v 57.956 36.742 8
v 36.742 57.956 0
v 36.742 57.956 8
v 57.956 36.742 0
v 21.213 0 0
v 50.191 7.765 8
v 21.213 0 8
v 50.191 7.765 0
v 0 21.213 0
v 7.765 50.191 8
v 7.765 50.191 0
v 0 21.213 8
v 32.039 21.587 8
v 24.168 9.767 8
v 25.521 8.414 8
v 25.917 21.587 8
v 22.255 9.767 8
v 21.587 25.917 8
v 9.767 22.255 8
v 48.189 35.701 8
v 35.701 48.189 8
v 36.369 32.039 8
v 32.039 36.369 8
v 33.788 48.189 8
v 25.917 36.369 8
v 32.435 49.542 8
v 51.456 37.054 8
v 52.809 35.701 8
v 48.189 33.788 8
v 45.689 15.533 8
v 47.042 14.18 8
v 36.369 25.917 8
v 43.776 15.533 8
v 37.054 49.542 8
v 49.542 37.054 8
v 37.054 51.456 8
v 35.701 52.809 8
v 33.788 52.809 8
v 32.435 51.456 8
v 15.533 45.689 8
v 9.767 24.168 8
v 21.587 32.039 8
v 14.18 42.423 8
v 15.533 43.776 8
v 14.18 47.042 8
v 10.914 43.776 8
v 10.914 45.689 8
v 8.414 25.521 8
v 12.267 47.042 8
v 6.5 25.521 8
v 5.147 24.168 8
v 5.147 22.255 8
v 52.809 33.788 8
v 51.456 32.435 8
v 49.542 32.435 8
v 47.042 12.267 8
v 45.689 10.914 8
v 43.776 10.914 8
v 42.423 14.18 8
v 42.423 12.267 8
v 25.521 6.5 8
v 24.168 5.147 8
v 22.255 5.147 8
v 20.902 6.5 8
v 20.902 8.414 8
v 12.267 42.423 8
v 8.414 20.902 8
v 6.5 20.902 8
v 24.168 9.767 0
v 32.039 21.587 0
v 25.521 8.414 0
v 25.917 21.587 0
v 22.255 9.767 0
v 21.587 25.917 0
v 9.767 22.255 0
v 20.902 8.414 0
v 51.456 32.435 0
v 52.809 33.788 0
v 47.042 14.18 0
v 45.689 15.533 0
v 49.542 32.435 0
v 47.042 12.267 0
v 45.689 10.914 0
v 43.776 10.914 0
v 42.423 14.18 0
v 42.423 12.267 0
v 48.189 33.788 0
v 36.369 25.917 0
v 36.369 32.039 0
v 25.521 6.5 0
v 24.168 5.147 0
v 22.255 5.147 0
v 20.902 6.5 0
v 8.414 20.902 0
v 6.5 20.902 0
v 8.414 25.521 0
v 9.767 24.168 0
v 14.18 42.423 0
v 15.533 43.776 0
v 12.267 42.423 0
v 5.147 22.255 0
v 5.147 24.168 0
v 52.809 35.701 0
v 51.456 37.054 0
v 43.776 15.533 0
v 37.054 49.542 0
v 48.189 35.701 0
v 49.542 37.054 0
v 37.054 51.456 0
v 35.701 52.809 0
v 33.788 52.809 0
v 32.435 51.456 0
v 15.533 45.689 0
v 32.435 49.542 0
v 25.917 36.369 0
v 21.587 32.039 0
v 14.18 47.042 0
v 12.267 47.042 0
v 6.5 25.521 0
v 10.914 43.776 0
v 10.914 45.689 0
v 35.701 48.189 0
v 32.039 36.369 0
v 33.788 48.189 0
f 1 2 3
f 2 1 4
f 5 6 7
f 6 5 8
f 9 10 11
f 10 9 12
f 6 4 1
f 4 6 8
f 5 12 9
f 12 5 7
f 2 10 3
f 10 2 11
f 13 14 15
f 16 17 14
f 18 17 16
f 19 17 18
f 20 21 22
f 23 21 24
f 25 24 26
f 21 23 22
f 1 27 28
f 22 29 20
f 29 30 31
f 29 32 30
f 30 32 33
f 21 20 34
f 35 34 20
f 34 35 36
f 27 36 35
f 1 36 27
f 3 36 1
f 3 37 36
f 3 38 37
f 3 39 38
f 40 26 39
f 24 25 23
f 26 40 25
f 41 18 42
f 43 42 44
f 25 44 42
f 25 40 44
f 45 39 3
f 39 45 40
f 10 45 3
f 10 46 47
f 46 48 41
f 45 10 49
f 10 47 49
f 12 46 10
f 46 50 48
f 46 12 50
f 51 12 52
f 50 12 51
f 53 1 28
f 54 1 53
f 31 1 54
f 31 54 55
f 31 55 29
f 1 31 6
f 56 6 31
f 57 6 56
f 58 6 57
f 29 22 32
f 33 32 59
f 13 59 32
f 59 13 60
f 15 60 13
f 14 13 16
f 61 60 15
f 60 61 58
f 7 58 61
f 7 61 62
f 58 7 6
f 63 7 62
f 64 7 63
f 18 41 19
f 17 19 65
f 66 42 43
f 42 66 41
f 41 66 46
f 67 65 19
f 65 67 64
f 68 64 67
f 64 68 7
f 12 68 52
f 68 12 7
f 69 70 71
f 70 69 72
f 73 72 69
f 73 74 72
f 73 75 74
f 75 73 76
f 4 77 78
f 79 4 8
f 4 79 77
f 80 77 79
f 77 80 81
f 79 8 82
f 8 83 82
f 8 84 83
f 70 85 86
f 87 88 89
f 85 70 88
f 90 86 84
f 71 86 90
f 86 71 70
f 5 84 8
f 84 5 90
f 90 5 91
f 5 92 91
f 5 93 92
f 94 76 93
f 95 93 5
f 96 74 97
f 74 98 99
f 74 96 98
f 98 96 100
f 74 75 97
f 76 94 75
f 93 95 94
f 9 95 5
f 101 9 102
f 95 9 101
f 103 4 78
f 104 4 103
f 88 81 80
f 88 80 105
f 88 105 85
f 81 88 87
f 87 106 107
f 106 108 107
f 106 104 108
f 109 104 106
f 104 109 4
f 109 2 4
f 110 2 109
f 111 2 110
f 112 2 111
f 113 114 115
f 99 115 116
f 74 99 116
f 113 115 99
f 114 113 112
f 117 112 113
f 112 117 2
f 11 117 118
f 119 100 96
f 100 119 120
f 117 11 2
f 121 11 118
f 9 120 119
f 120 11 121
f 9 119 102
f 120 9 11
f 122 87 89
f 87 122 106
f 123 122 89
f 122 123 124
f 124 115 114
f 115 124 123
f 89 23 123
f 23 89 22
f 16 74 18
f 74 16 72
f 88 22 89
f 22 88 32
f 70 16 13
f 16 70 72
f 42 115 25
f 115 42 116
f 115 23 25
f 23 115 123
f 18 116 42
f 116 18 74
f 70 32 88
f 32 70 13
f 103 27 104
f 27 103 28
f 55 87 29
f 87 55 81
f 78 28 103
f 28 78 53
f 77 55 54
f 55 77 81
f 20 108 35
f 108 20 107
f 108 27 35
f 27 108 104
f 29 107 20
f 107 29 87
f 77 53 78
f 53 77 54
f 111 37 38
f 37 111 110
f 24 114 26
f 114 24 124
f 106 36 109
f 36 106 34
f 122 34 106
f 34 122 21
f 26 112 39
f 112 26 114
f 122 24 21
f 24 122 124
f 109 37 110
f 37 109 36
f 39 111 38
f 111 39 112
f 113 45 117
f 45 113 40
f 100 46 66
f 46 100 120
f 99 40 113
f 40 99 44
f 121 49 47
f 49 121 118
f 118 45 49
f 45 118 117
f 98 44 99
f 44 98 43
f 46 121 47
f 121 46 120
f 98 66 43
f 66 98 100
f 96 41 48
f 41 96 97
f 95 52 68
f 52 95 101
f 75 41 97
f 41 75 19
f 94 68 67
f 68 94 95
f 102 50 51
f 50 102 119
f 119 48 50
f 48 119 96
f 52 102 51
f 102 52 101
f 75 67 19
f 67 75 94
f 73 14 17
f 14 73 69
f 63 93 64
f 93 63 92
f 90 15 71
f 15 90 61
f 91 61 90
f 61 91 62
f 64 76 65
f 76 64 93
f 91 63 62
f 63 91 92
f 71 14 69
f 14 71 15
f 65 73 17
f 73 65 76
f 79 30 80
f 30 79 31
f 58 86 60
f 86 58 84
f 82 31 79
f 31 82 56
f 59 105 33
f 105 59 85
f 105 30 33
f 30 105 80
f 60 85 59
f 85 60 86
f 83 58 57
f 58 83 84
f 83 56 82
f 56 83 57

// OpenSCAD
$fn = 32;

// ----------------------------------------------------------------------
// Polygon plate: 6-gon R30, 6 bolt windows
// ----------------------------------------------------------------------

// --- parameters (mm) ---
sides = 6;                // number of polygon sides
plate_r = 30;             // circumscribed radius of the polygon
bore_r = 8;               // centre bore radius
bolts = 6;                // number of bolt windows
ring_r = 22.28;           // bolt-circle radius
bolt_r = 2.5;             // bolt window radius
plate_t = 8;              // plate thickness, Z (extrusion height)
fit_tol = 0.1;            // declared fit tolerance (prompt contract)
free_tol = 0.5;           // declared free tolerance (prompt contract)

plate_d = 2 * plate_r;  // circumscribed diameter
bore_d = 2 * bore_r;  // centre bore diameter
bolt_d = 2 * bolt_r;  // bolt window diameter
ring_d = 2 * ring_r;  // bolt-circle diameter

profile = [[57.956, 36.742], [36.742, 57.956], [7.765, 50.191], [0, 21.213], [21.213, 0], [50.191, 7.765]];  // primary outline, 6 points, counter clockwise
void_1 = [[36.369, 32.039], [32.039, 36.369], [25.917, 36.369], [21.587, 32.039], [21.587, 25.917], [25.917, 21.587], [32.039, 21.587], [36.369, 25.917]];  // centre bore, 8 points
void_2 = [[52.809, 35.701], [51.456, 37.054], [49.542, 37.054], [48.189, 35.701], [48.189, 33.788], [49.542, 32.435], [51.456, 32.435], [52.809, 33.788]];  // bolt window 1, 8 points
void_3 = [[37.054, 51.456], [35.701, 52.809], [33.788, 52.809], [32.435, 51.456], [32.435, 49.542], [33.788, 48.189], [35.701, 48.189], [37.054, 49.542]];  // bolt window 2, 8 points
void_4 = [[15.533, 45.689], [14.18, 47.042], [12.267, 47.042], [10.914, 45.689], [10.914, 43.776], [12.267, 42.423], [14.18, 42.423], [15.533, 43.776]];  // bolt window 3, 8 points
void_5 = [[9.767, 24.168], [8.414, 25.521], [6.5, 25.521], [5.147, 24.168], [5.147, 22.255], [6.5, 20.902], [8.414, 20.902], [9.767, 22.255]];  // bolt window 4, 8 points
void_6 = [[25.521, 8.414], [24.168, 9.767], [22.255, 9.767], [20.902, 8.414], [20.902, 6.5], [22.255, 5.147], [24.168, 5.147], [25.521, 6.5]];  // bolt window 5, 8 points
void_7 = [[47.042, 14.18], [45.689, 15.533], [43.776, 15.533], [42.423, 14.18], [42.423, 12.267], [43.776, 10.914], [45.689, 10.914], [47.042, 12.267]];  // bolt window 6, 8 points

// --- the one profile operation ---
difference() {
  linear_extrude(height = plate_t) polygon(points = profile);
  translate([0, 0, -1])
    linear_extrude(height = plate_t + 2) polygon(points = void_1);
  translate([0, 0, -1])
    linear_extrude(height = plate_t + 2) polygon(points = void_2);
  translate([0, 0, -1])
    linear_extrude(height = plate_t + 2) polygon(points = void_3);
  translate([0, 0, -1])
    linear_extrude(height = plate_t + 2) polygon(points = void_4);
  translate([0, 0, -1])
    linear_extrude(height = plate_t + 2) polygon(points = void_5);
  translate([0, 0, -1])
    linear_extrude(height = plate_t + 2) polygon(points = void_6);
  translate([0, 0, -1])
    linear_extrude(height = plate_t + 2) polygon(points = void_7);
}
